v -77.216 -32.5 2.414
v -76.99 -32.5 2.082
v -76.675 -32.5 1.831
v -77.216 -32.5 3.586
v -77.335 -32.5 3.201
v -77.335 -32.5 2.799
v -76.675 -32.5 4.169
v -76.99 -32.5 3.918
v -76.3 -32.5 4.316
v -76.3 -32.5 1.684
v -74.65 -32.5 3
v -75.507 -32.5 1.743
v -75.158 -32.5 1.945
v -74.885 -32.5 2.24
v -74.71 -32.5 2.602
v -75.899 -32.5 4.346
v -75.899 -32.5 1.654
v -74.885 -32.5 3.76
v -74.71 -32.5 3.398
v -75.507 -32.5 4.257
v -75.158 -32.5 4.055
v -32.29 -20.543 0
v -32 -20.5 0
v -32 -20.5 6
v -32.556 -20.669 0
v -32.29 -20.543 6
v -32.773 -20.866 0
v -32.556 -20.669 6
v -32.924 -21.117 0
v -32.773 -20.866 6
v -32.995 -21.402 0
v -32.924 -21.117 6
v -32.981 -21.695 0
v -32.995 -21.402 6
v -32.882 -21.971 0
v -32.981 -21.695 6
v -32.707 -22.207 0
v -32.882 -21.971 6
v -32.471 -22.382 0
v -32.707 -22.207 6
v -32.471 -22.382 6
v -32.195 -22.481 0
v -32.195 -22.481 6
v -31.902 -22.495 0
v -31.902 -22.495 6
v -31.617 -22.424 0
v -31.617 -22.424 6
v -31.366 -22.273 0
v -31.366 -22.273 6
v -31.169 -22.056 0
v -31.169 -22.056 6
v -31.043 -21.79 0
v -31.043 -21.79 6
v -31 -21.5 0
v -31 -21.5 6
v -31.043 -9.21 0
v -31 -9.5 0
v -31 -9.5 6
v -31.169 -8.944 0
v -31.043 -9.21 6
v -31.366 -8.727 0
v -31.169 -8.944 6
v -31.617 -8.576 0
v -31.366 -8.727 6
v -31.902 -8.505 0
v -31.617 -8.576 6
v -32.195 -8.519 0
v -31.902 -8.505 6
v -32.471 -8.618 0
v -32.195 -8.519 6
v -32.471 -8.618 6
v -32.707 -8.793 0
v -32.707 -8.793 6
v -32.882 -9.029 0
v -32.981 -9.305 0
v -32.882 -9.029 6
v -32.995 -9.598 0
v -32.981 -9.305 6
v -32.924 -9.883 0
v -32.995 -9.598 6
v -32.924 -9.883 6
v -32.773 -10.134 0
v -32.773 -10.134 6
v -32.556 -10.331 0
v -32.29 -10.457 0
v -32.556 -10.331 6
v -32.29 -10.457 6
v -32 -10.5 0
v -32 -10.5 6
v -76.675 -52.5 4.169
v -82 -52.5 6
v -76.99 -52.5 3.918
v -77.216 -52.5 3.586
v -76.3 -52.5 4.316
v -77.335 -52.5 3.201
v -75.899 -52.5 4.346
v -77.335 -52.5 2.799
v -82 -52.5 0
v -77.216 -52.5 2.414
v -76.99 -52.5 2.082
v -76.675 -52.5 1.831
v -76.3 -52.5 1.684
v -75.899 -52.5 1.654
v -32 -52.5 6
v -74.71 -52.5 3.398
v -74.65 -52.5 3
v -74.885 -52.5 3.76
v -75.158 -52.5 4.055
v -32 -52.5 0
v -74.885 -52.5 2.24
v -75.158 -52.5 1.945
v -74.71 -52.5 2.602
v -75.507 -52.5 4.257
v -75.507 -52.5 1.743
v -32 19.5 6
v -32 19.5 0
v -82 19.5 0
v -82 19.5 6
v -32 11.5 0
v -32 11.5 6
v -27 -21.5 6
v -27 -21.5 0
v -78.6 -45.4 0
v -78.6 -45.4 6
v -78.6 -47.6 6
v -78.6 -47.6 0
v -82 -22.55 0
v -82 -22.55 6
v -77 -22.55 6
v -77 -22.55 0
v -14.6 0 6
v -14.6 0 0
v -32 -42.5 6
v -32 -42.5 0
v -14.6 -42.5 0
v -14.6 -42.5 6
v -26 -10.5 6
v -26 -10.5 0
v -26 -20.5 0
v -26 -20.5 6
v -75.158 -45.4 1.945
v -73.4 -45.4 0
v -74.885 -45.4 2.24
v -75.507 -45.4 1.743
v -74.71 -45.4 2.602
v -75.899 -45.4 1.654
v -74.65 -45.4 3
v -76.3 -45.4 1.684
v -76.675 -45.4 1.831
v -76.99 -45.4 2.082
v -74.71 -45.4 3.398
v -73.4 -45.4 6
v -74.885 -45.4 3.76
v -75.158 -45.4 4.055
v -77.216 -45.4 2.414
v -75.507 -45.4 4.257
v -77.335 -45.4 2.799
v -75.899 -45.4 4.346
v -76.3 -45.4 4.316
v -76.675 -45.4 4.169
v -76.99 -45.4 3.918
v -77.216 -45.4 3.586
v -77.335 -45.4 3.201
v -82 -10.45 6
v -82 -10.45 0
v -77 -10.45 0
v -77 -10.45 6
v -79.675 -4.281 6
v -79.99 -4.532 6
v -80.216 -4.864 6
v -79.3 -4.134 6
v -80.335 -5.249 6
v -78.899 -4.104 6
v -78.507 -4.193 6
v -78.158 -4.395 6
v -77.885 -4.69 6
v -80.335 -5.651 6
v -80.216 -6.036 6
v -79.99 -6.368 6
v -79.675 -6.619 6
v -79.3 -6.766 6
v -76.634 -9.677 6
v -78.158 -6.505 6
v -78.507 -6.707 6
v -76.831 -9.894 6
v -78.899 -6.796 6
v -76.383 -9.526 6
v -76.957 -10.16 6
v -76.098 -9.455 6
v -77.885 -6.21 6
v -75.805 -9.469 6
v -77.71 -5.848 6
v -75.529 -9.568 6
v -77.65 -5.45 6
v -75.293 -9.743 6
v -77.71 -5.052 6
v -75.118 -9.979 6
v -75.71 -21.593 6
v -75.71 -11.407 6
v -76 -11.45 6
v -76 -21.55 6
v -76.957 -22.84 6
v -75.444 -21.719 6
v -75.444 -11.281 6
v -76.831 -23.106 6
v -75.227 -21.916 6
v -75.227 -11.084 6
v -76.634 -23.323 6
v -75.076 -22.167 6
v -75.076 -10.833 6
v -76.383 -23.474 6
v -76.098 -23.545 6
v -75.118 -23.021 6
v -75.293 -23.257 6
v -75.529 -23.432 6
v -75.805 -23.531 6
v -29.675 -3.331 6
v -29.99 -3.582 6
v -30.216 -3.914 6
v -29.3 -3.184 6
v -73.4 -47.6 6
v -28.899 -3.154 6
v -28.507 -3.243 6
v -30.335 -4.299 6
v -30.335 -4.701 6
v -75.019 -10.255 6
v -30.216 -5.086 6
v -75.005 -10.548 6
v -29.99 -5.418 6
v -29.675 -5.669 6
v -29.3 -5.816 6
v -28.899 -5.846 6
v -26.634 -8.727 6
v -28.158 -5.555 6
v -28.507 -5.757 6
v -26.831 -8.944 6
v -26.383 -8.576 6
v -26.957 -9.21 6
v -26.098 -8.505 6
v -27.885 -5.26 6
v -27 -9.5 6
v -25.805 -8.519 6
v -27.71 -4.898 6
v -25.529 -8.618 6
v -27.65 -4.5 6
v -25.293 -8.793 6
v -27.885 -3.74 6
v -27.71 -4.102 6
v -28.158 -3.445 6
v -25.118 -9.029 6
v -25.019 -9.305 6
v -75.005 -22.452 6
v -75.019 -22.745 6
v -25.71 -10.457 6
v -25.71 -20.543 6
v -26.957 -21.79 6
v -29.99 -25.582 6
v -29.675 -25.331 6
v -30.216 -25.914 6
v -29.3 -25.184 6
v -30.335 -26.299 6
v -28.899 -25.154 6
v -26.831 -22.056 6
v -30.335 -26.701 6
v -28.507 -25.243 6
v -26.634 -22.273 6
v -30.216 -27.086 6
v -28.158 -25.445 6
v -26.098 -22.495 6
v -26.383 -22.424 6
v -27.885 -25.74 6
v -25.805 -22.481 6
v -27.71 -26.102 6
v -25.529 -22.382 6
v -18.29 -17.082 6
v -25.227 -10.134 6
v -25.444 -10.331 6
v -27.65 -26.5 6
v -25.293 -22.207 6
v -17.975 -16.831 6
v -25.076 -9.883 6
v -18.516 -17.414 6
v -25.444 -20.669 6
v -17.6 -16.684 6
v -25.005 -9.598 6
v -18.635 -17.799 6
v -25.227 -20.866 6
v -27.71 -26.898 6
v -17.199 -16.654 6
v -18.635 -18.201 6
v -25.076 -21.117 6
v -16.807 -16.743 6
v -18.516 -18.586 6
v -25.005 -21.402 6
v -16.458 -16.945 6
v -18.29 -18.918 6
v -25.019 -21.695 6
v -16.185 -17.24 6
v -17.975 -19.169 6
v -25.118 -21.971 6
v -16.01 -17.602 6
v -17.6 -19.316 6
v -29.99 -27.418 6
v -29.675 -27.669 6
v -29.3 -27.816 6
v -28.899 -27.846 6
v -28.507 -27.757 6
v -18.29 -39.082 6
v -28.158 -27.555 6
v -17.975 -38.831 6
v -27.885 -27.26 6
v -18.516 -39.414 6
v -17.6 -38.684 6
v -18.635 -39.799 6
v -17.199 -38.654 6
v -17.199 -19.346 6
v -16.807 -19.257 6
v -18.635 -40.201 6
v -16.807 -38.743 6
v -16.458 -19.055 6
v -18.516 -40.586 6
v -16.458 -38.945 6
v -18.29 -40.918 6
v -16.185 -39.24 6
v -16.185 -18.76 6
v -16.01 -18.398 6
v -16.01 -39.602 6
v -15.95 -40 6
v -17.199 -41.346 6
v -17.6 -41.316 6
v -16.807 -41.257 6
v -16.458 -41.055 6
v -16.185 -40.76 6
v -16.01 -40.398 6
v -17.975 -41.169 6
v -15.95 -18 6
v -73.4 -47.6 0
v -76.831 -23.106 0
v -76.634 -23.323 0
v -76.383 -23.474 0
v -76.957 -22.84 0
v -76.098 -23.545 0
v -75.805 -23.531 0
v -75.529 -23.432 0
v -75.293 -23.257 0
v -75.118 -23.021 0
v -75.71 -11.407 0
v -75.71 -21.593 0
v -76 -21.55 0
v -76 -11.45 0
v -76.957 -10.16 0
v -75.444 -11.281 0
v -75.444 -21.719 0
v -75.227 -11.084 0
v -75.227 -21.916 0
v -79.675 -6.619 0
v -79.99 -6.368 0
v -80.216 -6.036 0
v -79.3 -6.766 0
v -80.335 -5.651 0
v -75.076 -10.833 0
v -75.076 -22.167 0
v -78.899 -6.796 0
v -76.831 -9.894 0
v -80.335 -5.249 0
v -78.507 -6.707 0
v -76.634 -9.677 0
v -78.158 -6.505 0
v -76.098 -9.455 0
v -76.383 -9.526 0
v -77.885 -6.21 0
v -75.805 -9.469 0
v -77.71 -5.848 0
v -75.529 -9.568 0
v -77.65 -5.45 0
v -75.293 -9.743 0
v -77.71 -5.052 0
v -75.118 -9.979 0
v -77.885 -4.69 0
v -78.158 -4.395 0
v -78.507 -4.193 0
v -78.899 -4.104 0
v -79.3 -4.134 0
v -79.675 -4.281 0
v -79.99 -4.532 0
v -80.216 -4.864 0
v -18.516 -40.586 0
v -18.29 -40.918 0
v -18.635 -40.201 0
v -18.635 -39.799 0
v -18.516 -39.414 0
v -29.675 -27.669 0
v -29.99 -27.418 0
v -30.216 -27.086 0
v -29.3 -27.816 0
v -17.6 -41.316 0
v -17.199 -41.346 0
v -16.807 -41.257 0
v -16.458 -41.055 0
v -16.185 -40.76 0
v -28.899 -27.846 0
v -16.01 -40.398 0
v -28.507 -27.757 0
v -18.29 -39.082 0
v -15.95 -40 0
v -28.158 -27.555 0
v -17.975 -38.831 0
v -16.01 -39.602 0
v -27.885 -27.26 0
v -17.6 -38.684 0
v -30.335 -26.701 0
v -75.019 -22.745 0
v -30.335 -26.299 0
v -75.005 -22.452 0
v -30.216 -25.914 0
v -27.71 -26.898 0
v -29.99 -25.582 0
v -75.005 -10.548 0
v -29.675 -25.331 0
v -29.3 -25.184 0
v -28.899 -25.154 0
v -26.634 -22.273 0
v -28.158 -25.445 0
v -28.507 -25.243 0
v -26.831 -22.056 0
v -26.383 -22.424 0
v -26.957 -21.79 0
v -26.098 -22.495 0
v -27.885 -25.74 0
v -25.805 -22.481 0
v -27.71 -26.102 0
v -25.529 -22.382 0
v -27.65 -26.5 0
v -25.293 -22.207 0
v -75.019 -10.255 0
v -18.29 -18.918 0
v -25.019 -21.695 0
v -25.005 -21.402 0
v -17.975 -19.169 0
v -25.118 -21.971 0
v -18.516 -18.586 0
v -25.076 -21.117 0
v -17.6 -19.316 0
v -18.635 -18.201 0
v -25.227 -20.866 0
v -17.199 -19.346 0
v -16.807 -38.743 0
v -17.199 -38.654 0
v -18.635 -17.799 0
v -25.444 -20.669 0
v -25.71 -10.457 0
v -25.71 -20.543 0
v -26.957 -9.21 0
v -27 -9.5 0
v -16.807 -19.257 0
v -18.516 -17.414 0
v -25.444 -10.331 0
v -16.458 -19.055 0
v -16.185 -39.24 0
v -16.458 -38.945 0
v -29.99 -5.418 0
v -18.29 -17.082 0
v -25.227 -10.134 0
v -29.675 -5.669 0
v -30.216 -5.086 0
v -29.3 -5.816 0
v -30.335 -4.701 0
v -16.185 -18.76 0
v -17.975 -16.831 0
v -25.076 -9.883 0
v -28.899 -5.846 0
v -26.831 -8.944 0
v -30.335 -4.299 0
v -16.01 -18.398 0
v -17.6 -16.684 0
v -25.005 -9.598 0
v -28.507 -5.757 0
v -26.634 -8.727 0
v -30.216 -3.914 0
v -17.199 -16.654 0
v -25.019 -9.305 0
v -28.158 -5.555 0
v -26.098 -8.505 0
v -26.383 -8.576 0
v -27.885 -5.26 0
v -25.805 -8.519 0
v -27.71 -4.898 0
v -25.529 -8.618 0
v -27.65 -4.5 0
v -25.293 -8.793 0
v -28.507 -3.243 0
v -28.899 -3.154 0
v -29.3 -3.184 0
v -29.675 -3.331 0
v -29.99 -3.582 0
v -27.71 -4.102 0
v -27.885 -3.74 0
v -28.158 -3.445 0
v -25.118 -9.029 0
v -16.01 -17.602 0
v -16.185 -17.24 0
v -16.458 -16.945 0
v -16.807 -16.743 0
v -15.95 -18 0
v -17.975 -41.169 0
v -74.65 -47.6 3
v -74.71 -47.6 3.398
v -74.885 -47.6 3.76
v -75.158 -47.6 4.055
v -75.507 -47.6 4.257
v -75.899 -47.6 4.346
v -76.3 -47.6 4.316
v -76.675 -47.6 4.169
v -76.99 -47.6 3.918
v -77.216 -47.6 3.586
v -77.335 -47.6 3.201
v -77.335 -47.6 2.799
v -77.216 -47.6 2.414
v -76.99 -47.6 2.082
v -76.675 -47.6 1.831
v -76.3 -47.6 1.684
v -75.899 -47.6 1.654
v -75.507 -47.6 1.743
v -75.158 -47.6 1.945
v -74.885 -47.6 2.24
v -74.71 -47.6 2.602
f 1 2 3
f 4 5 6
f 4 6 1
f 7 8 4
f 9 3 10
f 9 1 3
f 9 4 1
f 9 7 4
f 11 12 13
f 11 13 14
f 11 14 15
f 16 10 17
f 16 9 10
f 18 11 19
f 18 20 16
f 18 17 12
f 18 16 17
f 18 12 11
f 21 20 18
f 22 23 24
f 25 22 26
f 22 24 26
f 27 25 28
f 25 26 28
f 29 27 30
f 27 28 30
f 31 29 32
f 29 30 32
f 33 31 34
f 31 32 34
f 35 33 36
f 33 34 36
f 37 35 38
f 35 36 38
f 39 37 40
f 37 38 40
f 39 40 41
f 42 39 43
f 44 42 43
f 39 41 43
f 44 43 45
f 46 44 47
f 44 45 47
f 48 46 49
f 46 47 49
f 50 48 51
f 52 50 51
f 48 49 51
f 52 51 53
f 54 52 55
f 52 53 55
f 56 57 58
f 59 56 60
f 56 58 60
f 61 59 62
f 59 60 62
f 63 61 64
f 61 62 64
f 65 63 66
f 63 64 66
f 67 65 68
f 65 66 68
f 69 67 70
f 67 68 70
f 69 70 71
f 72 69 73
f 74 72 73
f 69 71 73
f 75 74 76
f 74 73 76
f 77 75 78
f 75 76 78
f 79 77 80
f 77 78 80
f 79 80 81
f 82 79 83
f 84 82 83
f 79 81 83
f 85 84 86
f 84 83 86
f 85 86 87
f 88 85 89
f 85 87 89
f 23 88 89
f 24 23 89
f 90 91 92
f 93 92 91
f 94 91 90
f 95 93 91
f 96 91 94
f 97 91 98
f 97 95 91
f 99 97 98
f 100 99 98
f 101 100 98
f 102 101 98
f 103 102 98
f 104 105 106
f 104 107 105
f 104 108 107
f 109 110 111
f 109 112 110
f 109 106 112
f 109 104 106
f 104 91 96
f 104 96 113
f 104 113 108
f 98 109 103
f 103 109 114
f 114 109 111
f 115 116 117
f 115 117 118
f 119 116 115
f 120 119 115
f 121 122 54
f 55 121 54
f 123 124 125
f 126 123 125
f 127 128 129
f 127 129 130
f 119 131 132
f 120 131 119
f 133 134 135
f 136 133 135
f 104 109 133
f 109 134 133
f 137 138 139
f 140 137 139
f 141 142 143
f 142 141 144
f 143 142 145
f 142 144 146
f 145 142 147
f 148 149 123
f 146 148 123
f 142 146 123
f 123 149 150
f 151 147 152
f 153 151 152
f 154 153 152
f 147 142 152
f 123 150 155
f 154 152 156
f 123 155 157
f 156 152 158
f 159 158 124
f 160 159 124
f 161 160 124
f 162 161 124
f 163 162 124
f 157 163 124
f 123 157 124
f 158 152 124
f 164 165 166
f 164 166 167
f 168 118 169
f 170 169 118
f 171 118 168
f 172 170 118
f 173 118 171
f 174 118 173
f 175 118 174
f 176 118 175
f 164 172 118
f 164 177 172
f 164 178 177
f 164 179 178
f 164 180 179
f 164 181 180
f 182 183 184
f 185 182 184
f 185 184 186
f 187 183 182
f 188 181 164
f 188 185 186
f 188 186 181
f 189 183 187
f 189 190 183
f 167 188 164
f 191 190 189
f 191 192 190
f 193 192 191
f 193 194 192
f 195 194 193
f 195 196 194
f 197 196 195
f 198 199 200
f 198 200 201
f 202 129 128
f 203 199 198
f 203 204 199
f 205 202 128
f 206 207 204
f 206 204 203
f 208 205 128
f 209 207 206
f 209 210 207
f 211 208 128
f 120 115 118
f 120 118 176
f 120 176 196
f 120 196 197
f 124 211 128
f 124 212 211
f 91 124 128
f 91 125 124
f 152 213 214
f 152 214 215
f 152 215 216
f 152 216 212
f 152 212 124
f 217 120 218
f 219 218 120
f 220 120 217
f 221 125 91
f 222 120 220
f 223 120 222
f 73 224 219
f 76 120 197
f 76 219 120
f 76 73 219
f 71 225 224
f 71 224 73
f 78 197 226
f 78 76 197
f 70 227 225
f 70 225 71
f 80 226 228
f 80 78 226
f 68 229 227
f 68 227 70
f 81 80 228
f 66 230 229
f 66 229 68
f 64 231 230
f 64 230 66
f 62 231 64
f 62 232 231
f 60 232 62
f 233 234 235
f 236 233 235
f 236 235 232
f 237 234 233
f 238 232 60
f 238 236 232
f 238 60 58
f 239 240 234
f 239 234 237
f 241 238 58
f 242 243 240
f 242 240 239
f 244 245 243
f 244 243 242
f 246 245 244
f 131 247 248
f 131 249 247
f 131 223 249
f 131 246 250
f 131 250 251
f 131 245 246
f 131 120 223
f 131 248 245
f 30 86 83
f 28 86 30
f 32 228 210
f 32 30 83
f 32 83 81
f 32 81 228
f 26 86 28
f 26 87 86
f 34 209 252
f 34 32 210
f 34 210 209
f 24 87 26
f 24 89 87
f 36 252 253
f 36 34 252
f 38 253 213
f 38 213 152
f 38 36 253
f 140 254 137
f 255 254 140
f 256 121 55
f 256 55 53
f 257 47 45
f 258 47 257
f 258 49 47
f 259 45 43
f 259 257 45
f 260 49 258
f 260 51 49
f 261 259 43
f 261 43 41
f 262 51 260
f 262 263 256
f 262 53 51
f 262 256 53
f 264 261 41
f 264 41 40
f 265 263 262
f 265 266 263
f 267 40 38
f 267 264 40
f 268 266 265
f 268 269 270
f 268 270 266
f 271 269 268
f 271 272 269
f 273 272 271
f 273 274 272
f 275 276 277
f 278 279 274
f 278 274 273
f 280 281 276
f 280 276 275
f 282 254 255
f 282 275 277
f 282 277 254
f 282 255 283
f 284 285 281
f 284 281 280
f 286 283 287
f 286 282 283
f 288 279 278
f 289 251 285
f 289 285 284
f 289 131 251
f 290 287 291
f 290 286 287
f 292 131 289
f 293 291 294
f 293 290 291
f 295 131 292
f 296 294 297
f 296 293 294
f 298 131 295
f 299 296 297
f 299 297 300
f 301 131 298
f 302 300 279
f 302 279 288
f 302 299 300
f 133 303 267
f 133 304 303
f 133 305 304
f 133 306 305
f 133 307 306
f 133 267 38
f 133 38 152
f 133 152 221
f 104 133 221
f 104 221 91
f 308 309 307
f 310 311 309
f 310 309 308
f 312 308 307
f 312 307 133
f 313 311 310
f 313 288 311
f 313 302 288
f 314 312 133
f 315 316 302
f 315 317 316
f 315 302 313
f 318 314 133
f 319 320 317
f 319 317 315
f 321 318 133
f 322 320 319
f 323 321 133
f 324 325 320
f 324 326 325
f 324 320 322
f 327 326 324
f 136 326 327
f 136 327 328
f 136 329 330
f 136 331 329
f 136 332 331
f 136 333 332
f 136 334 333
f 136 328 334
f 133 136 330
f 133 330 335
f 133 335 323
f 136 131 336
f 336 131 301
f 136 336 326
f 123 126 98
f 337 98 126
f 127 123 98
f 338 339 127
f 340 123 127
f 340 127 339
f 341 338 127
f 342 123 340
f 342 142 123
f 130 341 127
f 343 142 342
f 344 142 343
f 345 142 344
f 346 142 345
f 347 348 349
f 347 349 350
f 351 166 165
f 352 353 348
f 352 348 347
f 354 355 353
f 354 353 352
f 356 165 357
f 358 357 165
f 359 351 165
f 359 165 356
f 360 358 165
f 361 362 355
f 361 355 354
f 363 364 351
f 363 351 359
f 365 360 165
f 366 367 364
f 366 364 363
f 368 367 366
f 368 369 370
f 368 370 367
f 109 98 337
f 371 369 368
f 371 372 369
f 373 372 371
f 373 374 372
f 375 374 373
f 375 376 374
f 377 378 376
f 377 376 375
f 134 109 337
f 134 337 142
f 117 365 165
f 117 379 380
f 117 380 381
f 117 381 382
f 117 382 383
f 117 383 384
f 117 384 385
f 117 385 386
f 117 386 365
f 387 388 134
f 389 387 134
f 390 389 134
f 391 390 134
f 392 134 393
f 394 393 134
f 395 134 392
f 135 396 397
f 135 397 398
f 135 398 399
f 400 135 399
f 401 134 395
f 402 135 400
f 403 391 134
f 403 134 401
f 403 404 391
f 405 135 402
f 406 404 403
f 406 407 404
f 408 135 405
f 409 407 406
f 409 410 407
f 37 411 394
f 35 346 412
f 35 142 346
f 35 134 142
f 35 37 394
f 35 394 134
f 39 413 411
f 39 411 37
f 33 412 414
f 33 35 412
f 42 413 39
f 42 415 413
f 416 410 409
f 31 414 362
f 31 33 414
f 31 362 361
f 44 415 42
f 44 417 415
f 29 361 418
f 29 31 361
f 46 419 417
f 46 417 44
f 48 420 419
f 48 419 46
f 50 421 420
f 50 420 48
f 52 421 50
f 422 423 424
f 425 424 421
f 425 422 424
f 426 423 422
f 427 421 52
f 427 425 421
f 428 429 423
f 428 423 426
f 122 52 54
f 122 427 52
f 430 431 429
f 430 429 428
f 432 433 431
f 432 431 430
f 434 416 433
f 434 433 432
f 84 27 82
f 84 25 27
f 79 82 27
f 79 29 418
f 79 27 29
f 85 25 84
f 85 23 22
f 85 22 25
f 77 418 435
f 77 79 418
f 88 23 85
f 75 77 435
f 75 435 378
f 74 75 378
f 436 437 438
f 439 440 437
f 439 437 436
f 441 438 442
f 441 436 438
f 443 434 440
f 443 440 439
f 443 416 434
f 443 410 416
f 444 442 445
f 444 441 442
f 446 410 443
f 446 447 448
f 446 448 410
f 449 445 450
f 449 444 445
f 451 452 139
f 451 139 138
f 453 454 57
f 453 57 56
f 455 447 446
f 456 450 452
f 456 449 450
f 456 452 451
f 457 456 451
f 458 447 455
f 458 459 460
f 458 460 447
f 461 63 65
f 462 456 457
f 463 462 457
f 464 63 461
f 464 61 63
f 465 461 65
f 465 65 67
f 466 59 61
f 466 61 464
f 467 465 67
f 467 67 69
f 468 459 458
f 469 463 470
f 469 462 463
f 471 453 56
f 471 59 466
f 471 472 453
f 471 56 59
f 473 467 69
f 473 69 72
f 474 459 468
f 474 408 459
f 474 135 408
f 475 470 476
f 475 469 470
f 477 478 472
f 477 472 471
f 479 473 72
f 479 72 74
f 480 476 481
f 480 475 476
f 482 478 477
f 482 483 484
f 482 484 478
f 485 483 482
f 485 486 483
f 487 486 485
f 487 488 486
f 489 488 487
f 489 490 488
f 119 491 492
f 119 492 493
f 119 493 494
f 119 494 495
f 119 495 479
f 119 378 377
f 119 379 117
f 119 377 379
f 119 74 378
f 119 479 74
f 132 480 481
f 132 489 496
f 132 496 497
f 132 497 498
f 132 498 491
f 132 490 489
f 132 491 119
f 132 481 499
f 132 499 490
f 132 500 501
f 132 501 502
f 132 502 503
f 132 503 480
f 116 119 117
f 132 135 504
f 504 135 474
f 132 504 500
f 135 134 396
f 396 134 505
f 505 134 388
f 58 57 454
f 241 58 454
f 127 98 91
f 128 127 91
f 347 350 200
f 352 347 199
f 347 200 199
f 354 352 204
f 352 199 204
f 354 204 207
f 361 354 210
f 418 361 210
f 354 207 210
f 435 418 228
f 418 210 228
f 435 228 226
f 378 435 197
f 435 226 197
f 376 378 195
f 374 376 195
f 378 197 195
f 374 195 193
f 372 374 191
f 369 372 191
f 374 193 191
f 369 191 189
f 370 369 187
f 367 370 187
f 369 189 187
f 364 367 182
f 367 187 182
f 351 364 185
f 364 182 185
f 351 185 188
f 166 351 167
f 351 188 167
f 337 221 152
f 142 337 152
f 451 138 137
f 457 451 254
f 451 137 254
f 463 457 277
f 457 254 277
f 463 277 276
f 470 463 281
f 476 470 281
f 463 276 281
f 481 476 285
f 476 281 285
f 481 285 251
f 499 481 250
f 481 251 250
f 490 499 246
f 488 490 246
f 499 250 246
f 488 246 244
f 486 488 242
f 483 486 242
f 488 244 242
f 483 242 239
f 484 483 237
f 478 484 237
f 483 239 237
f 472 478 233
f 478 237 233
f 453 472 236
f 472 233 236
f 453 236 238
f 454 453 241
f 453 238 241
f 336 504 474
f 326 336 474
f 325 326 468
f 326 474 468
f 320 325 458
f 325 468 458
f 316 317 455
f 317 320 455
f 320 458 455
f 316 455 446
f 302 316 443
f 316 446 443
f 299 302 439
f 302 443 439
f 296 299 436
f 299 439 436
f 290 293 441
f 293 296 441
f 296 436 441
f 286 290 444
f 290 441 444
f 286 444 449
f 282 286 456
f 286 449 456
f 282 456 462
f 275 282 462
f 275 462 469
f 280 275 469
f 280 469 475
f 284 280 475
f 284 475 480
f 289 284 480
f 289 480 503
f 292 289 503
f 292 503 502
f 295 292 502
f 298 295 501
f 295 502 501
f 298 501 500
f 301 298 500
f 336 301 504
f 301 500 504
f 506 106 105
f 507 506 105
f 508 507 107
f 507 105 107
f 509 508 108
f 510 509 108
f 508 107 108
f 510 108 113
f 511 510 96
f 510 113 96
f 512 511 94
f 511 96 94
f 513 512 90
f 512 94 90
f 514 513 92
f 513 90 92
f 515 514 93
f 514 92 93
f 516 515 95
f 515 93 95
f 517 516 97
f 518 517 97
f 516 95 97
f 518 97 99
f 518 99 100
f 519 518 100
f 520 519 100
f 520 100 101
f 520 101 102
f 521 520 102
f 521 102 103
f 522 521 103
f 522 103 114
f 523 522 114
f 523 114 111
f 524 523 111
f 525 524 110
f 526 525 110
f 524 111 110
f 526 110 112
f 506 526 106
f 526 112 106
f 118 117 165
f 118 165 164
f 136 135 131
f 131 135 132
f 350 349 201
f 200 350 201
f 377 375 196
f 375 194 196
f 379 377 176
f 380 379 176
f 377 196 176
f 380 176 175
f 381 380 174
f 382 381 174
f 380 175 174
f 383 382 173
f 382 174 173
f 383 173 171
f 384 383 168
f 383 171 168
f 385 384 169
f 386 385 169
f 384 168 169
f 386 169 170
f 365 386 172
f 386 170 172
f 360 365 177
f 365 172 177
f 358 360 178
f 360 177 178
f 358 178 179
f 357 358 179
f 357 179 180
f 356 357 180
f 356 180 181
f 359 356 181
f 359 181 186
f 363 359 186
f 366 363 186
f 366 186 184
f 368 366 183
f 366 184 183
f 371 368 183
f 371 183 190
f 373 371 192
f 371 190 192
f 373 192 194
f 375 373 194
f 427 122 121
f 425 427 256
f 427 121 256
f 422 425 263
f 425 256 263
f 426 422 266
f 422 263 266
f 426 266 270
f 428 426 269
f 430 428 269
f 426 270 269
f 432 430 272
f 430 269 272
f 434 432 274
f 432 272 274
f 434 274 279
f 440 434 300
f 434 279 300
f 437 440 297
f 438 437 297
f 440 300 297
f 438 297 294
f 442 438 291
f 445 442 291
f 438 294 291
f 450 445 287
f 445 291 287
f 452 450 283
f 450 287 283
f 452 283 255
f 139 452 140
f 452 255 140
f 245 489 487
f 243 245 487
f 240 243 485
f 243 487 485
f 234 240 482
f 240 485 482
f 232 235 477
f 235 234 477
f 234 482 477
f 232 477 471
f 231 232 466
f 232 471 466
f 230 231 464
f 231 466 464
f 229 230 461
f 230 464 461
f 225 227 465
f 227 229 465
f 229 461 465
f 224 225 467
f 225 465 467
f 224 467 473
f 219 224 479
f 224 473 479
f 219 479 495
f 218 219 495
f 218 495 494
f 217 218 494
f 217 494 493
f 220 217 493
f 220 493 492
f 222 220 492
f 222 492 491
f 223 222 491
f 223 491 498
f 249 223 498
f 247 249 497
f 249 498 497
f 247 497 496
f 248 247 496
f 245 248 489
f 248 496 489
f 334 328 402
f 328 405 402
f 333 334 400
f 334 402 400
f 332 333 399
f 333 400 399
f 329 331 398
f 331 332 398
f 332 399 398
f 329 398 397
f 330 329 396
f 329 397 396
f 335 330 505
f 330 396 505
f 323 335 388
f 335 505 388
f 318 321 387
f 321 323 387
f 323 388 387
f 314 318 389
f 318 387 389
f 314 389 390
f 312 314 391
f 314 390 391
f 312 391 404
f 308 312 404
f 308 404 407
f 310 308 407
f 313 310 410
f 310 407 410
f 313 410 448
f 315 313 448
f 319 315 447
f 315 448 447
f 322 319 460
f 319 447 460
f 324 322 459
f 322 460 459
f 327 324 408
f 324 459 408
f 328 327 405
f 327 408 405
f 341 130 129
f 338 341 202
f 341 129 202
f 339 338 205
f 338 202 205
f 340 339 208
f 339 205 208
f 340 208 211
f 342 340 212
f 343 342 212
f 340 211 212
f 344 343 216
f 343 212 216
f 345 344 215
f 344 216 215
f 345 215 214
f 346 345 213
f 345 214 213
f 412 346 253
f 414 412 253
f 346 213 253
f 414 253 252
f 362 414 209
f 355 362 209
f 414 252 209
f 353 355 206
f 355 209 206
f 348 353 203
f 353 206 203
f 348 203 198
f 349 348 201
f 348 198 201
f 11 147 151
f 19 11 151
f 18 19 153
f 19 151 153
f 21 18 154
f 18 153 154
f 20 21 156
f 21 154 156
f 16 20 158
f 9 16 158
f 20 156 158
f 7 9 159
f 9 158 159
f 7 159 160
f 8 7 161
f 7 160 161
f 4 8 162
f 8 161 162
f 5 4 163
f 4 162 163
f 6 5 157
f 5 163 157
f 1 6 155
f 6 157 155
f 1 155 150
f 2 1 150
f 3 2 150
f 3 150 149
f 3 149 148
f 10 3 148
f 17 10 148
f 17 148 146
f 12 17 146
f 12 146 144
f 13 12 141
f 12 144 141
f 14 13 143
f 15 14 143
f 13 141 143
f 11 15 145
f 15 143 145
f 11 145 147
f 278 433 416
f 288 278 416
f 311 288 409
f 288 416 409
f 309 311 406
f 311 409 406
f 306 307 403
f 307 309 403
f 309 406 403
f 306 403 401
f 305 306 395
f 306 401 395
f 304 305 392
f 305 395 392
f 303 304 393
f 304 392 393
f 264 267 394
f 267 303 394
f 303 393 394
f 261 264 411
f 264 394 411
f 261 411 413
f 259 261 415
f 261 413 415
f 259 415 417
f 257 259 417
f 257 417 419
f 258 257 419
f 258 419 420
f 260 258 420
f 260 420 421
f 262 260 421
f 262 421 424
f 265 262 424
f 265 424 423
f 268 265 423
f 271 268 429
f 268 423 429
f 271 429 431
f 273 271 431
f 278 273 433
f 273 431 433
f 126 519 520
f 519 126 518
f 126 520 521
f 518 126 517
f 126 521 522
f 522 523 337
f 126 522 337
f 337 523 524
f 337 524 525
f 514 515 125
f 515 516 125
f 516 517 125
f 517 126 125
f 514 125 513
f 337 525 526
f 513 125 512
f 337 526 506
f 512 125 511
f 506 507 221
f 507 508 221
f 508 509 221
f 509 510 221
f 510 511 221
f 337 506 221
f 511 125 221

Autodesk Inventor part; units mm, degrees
ref_plane "YZ Plane" through (0, 0, 0) normal (1, 0, 0) x (0, 1, 0)
ref_plane "XZ Plane" through (0, 0, 0) normal (0, 1, 0) x (-1, 0, 0)
ref_plane "XY Plane" through (0, 0, 0) normal (0, 0, 1) x (1, 0, 0)
ref_plane "작업 평면1" through (0, 0, 0) normal (0, 0, 1) x (1, 0, 0)
sketch "스케치1" plane through (0, 0, 0) normal (0, 0, 1) x (1, 0, 0)
  arc A0 (20.1, 4.5766) -> (19.5808, 6.2636) centre (17.1, 4.5766) ccw projected
  line L0 (19.5808, 6.2636) -> (15.5953, 12.1246) projected
  arc A1 (15.5953, 12.1246) -> (13.9414, 13) centre (13.9414, 11) ccw projected
  line L1 (13, 13) -> (13.9414, 13) projected
  arc A2 (14.5, 11.5) -> (13, 13) centre (13, 11.5) ccw projected
  line L2 (14.5, -41.5) -> (14.5, 11.5) projected
  arc A3 (13.5, -42.5) -> (14.5, -41.5) centre (13.5, -41.5) ccw projected
  line L3 (-13.5, -42.5) -> (13.5, -42.5) projected
  arc A4 (-14.5, -41.5) -> (-13.5, -42.5) centre (-13.5, -41.5) ccw projected
  line L4 (-14.5, 11.5) -> (-14.5, -41.5) projected
  arc A5 (-13, 13) -> (-14.5, 11.5) centre (-13, 11.5) ccw projected
  line L5 (-13.9414, 13) -> (-13, 13) projected
  arc A6 (-13.9414, 13) -> (-15.5953, 12.1246) centre (-13.9414, 11) ccw projected
  line L6 (-15.5953, 12.1246) -> (-19.5808, 6.2636) projected
  arc A7 (-19.5808, 6.2636) -> (-20.1, 4.5766) centre (-17.1, 4.5766) ccw projected
  line L7 (-20.1, 4.5766) -> (-20.1, -39.6766) projected
  arc A8 (-20.1, -39.6766) -> (-19.5808, -41.3636) centre (-17.1, -39.6766) ccw projected
  line L8 (-19.5808, -41.3636) -> (-15.8929, -46.7869) projected
  arc A9 (-15.8929, -46.7869) -> (-13.4121, -48.1) centre (-13.4121, -45.1) ccw projected
  line L9 (-13.4121, -48.1) -> (13.4121, -48.1) projected
  arc A10 (13.4121, -48.1) -> (15.8929, -46.7869) centre (13.4121, -45.1) ccw projected
  line L10 (15.8929, -46.7869) -> (19.5808, -41.3636) projected
  arc A11 (19.5808, -41.3636) -> (20.1, -39.6766) centre (17.1, -39.6766) ccw projected
  line L11 (20.1, -39.6766) -> (20.1, 4.5766) projected
  circle A12 centre (-17.3, 4) radius 1.35 projected
  circle A13 centre (-17.3, -18) radius 1.35 projected
  circle A14 centre (-11, -45.3) radius 1.35 projected
  circle A15 centre (17.3, 4) radius 1.35 projected
  circle A16 centre (17.3, -18) radius 1.35 projected
  circle A17 centre (11, -45.3) radius 1.35 projected
  circle A18 centre (-17.3, -40) radius 1.35 projected
  circle A19 centre (17.3, -40) radius 1.35 projected
  arc A20 (-14.6, -41.5) -> (-13.5, -42.6) centre (-13.5, -41.5) ccw
  line L12 (-13.5, -42.6) -> (13.5, -42.6)
  arc A21 (13.5, -42.6) -> (14.6, -41.5) centre (13.5, -41.5) ccw
  line L13 (14.6, -41.5) -> (14.6, 11.5)
  arc A22 (14.6, 11.5) -> (12.2254, 12.9) centre (13, 11.5) ccw
  line L14 (12.2254, 12.9) -> (13.9414, 12.9)
  arc A23 (15.5126, 12.0684) -> (13.9414, 12.9) centre (13.9414, 11) ccw
  line L15 (15.5126, 12.0684) -> (19.4981, 6.2073)
  arc A24 (20, 4.5766) -> (19.4981, 6.2073) centre (17.1, 4.5766) ccw
  line L16 (20, 4.5766) -> (20, -39.6766)
  arc A25 (19.4981, -41.3073) -> (20, -39.6766) centre (17.1, -39.6766) ccw
  line L17 (19.4981, -41.3073) -> (15.8102, -46.7307)
  arc A26 (13.4121, -48) -> (15.8102, -46.7307) centre (13.4121, -45.1) ccw
  line L18 (13.4121, -48) -> (-13.4121, -48)
  arc A27 (-15.8102, -46.7307) -> (-13.4121, -48) centre (-13.4121, -45.1) ccw
  line L19 (-15.8102, -46.7307) -> (-18.6871, -42.5)
  line L20 (-19.4981, 6.2073) -> (-15.5126, 12.0684)
  arc A28 (-13.9414, 12.9) -> (-15.5126, 12.0684) centre (-13.9414, 11) ccw
  line L21 (-13.9414, 12.9) -> (-12.2254, 12.9)
  arc A29 (-12.2254, 12.9) -> (-14.6, 11.5) centre (-13, 11.5) ccw
  line L22 (-14.6, 11.5) -> (-14.6, -41.5)
  line L23 (-14.6, 11.5) -> (-20, 11.5)
  line L24 (-20, -42.5) -> (-14.6, -42.5)
  line L25 (-14.6, -42.5) -> (-14.6, 11.5)
  line L26 (-20, 11.5) -> (-32, 11.5)
  line L27 (-32, -42.5) -> (-20, -42.5)
  circle A30 centre (-17.3, 4) radius 1.35
  circle A31 centre (-17.3, -18) radius 1.35
  circle A32 centre (-17.3, -40) radius 1.35
  line L28 (-32, -9.5) -> (-26, -9.5)
  line L29 (-26, -9.5) -> (-26, -21.5)
  line L30 (-26, -21.5) -> (-32, -21.5)
  line L31 (-32, 11.5) -> (-32, -9.5)
  line L32 (-32, -21.5) -> (-32, -42.5)
  circle A33 centre (-29, -4.5) radius 1.35
  circle A34 centre (-29, -26.5) radius 1.35
  point P0 (0, 0)
  dimension "d0" = 0.1
  dimension "d2" = 2.7
  dimension "d3" = 2.7
  dimension "d4" = 2.7
  dimension "d5" = 12
  dimension "d6" = 2.7
  dimension "d7" = 2.7
extrude "돌출1" add sketch "스케치1" along normal blind 6 contours L24 L27 L32 L30 L29 L28 L31 L26 L23 L6 A7 L7 A8 L8 | L8 A8 L7 A7 L6 L23 L22 L25 L24
sketch "스케치2" plane through (-32, -42.5, 0) normal (-1, 0, 0) x (0, 0, 1)
  line L0 (0, 62) -> (6, 62)
  line L1 (6, 62) -> (6, -10)
  line L2 (6, -10) -> (0, -10)
  line L3 (0, -10) -> (0, 62)
  point P0 (0, 42.5)
  dimension "d10" = 6
  dimension "d11" = 72
extrude "돌출2" add sketch "스케치2" along normal blind 50
sketch "스케치3" plane through (0, 0, 6) normal (0, 0, 1) x (1, 0, 0)
  line L0 (-32, -42.5) -> (-14.6, -42.5) projected
  line L1 (-14.6, -42.5) -> (-14.6, 11.5) projected
  line L2 (-14.6, 11.5) -> (-32, 11.5) projected
  line L3 (-32, 11.5) -> (-32, 19.5) projected
  line L4 (-32, 19.5) -> (-82, 19.5) projected
  line L5 (-82, -52.5) -> (-82, 19.5) projected
  line L6 (-32, -52.5) -> (-82, -52.5) projected
  line L7 (-32, -52.5) -> (-32, -42.5) projected
  line L8 (-32, -21.5) -> (-32, -9.5) projected
  line L9 (-32, -9.5) -> (-26, -9.5) projected
  line L10 (-26, -9.5) -> (-26, -21.5) projected
  line L11 (-26, -21.5) -> (-32, -21.5) projected
  circle A0 centre (-17.3, -18) radius 1.35 projected
  circle A1 centre (-17.3, 4) radius 1.35 projected
  circle A2 centre (-17.3, -40) radius 1.35 projected
  circle A3 centre (-29, -26.5) radius 1.35 projected
  circle A4 centre (-29, -4.5) radius 1.35 projected
  line L12 (-14.6, 0) -> (-32, 11.5)
  line L13 (-32, 11.5) -> (-14.6, 11.5)
  point P0 (0, 0)
extrude "돌출3" cut sketch "스케치3" against normal blind 50 contours L12 L2 L1
sketch "스케치5" plane through (-82, -42.5, 0) normal (-1, 0, 0) x (0, 0, 1)
  line L0 (-2.9941, 20.5626) -> (2.9941, 31.4374) construction
  line L1 (2.9941, 20.5626) -> (-2.9941, 31.4374) construction
  line L2 (0, 20) -> (0, 32)
  line L3 (6, 32) -> (6, 20)
  line L4 (6, 20) -> (0, 32) construction
  line L5 (0, 20) -> (6, 32) construction
  line L6 (6.025, 19.95) -> (-0.025, 19.95)
  line L7 (-0.025, 19.95) -> (-0.025, 32.05)
  line L8 (-0.025, 32.05) -> (6.025, 32.05)
  line L9 (6.025, 32.05) -> (6.025, 19.95)
  line L10 (6.025, 19.95) -> (-0.025, 32.05) construction
  line L11 (-0.025, 19.95) -> (6.025, 32.05) construction
  point P0 (0, 42.5)
  point P1 (0, 26)
  point P2 (3, 26)
  dimension "d16" = 6
  dimension "d17" = 12
  dimension "d18" = 12.1
extrude "돌출4" cut sketch "스케치5" against normal blind 6
sketch "스케치6" plane through (0, 0, 6) normal (0, 0, 1) x (1, 0, 0)
  line L0 (-76, -10.45) -> (-76, -22.55) projected
  line L1 (-82, -10.45) -> (-76, -10.45) projected
  line L2 (-76, -22.55) -> (-82, -22.55) projected
  circle A0 centre (-79, -5.45) radius 1.35
  point P0 (0, 0)
  dimension "d21" = 2.7
extrude "돌출5" cut sketch "스케치6" against normal blind 6
sketch "스케치7" plane through (-32, -52.5, 0) normal (0, -1, 0) x (1, 0, 0)
  line L0 (0, 0) -> (0, 6) projected
  line L1 (0, 6) -> (-50, 6) projected
  line L2 (-50, 0) -> (-50, 6) projected
  line L3 (0, 0) -> (-50, 0) projected
  circle A0 centre (-44, 3) radius 1.35
  point P0 (32, 0)
  dimension "d24" = 2.7
extrude "돌출6" cut sketch "스케치7" against normal blind 20 contours A0
sketch "스케치8" plane through (0, 0, 6) normal (0, 0, 1) x (1, 0, 0)
  circle A0 centre (-79, -5.45) radius 1.35 projected
  line L0 (-76, -22.55) -> (-82, -22.55) projected
  line L1 (-82, -52.5) -> (-82, -22.55) projected
  line L2 (-32, -52.5) -> (-82, -52.5) projected
  line L3 (-32, -52.5) -> (-32, -42.5) projected
  line L4 (-32, -42.5) -> (-14.6, -42.5) projected
  line L5 (-14.6, -42.5) -> (-14.6, 0) projected
  line L6 (-14.6, 0) -> (-32, 11.5) projected
  line L7 (-32, 11.5) -> (-32, 19.5) projected
  line L8 (-32, 19.5) -> (-82, 19.5) projected
  line L9 (-82, -10.45) -> (-82, 19.5) projected
  line L10 (-82, -10.45) -> (-76, -10.45) projected
  line L11 (-76, -10.45) -> (-76, -22.55) projected
  line L12 (-32, -21.5) -> (-32, -9.5) projected
  line L13 (-32, -9.5) -> (-26, -9.5) projected
  line L14 (-26, -9.5) -> (-26, -21.5) projected
  line L15 (-26, -21.5) -> (-32, -21.5) projected
  circle A1 centre (-17.3, -18) radius 1.35 projected
  circle A2 centre (-17.3, -40) radius 1.35 projected
  circle A3 centre (-29, -26.5) radius 1.35 projected
  circle A4 centre (-29, -4.5) radius 1.35 projected
  line L16 (-73.4, -45.4) -> (-78.6, -45.4)
  line L17 (-78.6, -45.4) -> (-78.6, -47.6)
  line L18 (-78.6, -47.6) -> (-73.4, -47.6)
  line L19 (-73.4, -47.6) -> (-73.4, -45.4)
  line L20 (-73.4, -45.4) -> (-78.6, -47.6) construction
  line L21 (-78.6, -45.4) -> (-73.4, -47.6) construction
  point P0 (0, 0)
  point P1 (-76, -46.5)
  dimension "d27" = 5.2
  dimension "d28" = 2.2
extrude "돌출7" cut sketch "스케치8" against normal blind 20 contours L19 L18 L17 L16
sketch "스케치9" plane through (0, 0, 6) normal (0, 0, 1) x (1, 0, 0)
  line L0 (-76, -10.45) -> (-76, -22.55) projected
  line L1 (-82, -10.45) -> (-76, -10.45) projected
  line L2 (-76, -22.55) -> (-82, -22.55) projected
  line L3 (-32, -21.5) -> (-32, -9.5) projected
  line L4 (-32, -9.5) -> (-26, -9.5) projected
  line L5 (-26, -9.5) -> (-26, -21.5) projected
  line L6 (-26, -21.5) -> (-32, -21.5) projected
  circle A0 centre (-76, -10.45) radius 1
  circle A1 centre (-76, -22.55) radius 1
  circle A2 centre (-32, -9.5) radius 1
  circle A3 centre (-26, -9.5) radius 1
  circle A4 centre (-26, -21.5) radius 1
  circle A5 centre (-32, -21.5) radius 1
  point P0 (0, 0)
  dimension "d31" = 2
  dimension "d32" = 2
  dimension "d33" = 2
  dimension "d34" = 2
  dimension "d35" = 2
  dimension "d36" = 2
extrude "돌출8" cut sketch "스케치9" against normal blind 10 contours L1 A0 L0 | L0 A0 L1 | A1 L2 L0 | L0 L2 A1 | L6 A5 L3 | L3 A5 L6 | A2 L4 L3 | L3 L4 A2 | A4 L5 L6 | L6 L5 A4 | A3 L5 L4 | L4 L5 A3
properties part number "side of head" material "PMMA 플라스틱"
